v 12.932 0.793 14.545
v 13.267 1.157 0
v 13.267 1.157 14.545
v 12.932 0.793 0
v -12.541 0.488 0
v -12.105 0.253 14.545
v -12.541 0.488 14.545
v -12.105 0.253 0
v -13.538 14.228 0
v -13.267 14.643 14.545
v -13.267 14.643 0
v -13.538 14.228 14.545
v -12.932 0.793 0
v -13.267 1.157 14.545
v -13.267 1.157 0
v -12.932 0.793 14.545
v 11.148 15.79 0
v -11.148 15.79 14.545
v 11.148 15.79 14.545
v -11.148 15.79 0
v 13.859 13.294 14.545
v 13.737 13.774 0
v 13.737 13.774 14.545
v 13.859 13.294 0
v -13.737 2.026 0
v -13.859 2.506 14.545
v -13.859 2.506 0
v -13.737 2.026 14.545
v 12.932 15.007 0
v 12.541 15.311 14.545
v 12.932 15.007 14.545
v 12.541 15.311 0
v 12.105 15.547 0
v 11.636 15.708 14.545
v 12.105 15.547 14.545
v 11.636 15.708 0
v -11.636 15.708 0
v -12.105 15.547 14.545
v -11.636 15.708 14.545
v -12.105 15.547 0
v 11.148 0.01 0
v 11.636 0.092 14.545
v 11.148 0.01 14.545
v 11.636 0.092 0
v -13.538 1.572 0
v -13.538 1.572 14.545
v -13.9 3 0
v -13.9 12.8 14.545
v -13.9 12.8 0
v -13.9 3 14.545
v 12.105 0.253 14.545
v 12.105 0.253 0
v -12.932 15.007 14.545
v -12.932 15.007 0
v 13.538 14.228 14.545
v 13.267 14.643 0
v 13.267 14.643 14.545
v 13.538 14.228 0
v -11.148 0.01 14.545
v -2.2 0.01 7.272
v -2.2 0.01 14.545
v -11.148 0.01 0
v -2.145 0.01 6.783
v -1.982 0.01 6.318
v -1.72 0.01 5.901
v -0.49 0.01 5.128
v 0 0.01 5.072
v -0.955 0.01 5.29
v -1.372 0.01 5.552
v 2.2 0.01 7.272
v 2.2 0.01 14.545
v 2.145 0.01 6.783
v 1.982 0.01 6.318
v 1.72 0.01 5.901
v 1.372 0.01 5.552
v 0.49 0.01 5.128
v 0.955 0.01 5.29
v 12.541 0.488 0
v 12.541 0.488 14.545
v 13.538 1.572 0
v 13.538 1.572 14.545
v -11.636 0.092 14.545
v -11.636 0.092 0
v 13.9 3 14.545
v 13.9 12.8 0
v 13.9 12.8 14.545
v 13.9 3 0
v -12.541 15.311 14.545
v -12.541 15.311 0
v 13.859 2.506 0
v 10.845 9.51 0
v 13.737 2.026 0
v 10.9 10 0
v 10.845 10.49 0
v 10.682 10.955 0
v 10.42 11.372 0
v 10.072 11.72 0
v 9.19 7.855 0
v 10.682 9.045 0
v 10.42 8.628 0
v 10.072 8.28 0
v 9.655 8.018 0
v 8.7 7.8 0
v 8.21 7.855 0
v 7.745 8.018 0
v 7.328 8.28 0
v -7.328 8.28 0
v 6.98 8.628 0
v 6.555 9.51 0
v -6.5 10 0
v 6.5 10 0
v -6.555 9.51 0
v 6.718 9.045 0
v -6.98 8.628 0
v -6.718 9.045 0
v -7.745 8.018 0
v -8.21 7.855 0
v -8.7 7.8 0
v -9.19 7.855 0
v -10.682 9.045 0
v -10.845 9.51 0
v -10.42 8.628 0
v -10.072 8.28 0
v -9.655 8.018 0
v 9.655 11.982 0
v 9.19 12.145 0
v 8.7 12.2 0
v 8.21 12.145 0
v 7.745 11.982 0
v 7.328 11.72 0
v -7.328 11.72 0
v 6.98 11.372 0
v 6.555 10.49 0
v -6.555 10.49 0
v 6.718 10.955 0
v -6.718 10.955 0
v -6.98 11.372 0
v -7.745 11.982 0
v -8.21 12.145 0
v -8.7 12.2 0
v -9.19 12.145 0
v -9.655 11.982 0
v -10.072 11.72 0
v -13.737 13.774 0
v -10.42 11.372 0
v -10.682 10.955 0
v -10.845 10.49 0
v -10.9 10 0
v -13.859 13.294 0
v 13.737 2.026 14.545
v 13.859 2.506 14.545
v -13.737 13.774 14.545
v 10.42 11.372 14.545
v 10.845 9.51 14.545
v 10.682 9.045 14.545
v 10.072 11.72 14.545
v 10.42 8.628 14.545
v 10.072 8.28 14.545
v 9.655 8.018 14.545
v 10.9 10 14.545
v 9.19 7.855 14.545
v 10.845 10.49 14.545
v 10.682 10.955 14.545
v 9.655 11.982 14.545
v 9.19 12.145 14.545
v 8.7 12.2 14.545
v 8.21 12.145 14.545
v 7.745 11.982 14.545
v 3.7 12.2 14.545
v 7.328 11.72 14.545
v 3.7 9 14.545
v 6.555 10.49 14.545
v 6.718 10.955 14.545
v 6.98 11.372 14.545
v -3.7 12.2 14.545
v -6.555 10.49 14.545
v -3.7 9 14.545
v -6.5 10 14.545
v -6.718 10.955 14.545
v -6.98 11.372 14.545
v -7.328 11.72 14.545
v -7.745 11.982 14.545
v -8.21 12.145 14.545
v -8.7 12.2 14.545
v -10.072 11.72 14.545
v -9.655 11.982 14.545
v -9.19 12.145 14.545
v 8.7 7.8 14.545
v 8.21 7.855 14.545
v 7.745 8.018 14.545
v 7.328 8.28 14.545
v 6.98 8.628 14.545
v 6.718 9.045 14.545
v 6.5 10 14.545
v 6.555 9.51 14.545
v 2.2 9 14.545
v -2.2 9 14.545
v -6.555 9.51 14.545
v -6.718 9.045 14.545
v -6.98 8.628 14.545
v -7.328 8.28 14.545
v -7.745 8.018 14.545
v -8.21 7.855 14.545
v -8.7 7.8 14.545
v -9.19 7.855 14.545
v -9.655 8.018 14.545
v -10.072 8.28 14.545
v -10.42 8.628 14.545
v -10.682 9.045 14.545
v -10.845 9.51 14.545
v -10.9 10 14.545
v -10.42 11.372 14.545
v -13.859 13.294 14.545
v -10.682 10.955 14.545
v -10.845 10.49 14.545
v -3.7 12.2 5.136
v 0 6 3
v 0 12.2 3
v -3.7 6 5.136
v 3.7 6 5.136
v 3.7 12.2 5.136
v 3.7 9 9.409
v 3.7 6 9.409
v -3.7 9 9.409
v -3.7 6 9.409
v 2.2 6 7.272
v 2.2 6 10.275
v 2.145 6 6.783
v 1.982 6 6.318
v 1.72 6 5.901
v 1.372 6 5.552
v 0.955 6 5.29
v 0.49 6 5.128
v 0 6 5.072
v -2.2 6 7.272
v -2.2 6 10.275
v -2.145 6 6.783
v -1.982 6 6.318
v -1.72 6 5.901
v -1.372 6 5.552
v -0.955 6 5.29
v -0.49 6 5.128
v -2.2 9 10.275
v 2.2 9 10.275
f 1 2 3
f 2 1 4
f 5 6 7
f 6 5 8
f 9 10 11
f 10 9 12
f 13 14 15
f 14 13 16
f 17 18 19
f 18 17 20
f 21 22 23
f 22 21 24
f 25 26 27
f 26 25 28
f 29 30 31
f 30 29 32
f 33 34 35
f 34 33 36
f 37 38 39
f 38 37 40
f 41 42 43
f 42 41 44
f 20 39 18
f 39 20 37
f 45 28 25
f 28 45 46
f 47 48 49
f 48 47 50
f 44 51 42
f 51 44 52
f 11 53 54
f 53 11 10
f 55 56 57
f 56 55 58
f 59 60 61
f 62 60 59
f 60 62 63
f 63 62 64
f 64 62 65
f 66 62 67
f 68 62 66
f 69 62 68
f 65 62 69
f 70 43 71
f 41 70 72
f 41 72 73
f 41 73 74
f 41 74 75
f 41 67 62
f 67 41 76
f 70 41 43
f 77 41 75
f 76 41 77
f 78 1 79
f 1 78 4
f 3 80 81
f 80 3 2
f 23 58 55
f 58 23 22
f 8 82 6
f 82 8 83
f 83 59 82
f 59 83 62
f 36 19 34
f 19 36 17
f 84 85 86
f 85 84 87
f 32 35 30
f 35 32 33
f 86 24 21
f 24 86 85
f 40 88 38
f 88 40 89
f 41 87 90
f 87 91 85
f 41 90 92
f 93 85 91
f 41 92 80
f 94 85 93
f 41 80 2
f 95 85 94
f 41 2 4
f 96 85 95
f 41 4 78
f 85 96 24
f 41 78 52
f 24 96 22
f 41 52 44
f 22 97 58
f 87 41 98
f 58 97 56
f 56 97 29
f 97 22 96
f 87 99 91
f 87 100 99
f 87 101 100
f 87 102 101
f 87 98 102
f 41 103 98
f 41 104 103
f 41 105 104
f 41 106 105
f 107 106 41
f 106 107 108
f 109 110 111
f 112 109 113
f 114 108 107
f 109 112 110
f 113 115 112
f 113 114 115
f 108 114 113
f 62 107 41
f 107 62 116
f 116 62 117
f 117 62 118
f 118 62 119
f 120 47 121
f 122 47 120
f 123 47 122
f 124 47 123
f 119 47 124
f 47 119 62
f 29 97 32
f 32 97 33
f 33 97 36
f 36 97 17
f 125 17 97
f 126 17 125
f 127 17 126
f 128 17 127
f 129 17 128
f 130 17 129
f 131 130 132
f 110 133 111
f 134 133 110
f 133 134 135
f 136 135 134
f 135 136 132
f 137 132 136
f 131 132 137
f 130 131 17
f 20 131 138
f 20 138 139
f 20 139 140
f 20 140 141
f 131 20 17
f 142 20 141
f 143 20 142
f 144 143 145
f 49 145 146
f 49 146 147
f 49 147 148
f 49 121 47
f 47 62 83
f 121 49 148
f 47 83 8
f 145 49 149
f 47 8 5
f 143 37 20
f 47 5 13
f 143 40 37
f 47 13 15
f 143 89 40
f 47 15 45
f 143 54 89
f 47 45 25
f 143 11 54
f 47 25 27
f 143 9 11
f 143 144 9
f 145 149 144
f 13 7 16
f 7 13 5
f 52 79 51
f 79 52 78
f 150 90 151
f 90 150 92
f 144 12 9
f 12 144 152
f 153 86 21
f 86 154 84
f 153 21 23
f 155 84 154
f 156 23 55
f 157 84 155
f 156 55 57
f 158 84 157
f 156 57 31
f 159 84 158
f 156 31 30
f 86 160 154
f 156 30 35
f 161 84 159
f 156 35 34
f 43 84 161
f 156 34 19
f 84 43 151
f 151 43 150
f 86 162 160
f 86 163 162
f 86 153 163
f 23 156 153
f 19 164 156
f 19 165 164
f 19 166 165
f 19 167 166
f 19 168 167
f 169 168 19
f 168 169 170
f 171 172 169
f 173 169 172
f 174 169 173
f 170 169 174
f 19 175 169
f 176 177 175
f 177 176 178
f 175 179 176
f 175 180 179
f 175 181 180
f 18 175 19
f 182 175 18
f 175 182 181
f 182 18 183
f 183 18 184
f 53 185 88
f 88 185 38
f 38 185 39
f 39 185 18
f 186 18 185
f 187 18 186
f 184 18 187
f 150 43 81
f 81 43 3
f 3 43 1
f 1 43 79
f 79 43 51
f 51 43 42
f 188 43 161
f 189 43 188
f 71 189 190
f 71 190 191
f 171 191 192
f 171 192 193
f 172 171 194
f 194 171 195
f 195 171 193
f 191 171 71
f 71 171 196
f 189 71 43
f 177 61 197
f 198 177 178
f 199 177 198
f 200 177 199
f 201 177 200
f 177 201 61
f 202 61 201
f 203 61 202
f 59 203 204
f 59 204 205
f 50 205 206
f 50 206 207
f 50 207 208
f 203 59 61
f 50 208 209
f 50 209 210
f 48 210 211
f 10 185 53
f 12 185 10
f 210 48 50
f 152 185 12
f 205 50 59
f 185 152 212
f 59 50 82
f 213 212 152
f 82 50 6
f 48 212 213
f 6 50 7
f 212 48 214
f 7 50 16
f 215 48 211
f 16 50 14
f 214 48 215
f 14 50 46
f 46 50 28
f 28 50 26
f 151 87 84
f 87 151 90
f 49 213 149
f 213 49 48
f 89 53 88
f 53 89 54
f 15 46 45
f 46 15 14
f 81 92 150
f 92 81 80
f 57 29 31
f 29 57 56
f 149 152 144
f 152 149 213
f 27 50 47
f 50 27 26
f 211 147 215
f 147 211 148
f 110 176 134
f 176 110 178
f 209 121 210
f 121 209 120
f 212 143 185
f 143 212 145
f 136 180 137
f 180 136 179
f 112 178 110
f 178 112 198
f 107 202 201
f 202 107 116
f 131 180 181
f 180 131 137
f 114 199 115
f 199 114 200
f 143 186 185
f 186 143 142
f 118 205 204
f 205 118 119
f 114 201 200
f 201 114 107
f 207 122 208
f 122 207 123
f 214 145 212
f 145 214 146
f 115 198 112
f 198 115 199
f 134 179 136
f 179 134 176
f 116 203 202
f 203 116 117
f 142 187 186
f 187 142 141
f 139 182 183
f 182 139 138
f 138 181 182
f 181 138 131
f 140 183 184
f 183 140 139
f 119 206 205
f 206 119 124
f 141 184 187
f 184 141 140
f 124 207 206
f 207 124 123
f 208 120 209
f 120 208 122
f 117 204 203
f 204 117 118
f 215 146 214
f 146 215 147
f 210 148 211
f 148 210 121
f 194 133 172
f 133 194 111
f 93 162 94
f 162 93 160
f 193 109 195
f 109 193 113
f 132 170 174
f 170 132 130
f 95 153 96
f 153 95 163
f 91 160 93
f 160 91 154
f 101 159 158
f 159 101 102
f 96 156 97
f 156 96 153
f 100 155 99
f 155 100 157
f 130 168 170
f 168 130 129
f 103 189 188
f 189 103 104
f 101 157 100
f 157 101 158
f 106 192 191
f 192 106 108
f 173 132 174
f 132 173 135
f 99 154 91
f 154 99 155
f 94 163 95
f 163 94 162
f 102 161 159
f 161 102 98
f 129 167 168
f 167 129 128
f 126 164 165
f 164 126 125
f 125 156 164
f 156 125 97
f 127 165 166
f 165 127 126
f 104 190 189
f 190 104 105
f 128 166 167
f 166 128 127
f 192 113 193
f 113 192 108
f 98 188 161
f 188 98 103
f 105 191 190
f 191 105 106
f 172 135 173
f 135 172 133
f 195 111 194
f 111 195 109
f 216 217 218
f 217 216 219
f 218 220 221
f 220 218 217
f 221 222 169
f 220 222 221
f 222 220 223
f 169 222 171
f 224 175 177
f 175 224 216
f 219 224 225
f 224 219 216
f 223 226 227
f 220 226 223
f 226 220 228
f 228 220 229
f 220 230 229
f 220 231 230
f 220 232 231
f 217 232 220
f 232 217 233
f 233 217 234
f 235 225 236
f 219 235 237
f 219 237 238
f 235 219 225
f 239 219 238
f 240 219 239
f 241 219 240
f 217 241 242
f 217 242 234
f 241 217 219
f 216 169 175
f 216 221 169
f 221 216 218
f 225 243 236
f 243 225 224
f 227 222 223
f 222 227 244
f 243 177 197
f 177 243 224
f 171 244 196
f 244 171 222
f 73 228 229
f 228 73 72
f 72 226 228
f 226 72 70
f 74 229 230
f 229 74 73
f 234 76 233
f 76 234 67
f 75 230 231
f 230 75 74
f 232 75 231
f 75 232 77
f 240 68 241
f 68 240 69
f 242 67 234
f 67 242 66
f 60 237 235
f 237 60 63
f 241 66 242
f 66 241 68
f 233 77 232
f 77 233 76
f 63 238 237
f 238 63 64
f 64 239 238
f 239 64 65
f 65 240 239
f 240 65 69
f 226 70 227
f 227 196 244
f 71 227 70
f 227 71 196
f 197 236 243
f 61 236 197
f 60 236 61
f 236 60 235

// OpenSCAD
// file: functions.scad
/*******************************************************************

This OpenSCAD code and its rendered 3D model are part of the

	Kühling&Kühling RepRap Industrial 3D Printer


All details, BOM, assembling instructions and latest sources:
	http://kuehlingkuehling.de

Designed and developed by:
	Jonas Kühling <mail@jonaskuehling.de>
	Simon Kühling <mail@simonkuehling.de>

Licensed under:
	Creative Commons Attribution-ShareAlike
	CC BY-SA 3.0
	http://creativecommons.org/licenses/by-sa/3.0/

*******************************************************************/

module teardrop (r=4.5,h=20,alpha=45,teardropcorner=0,fulldrop=0){		// tear drop hole for top-centering
											// use teardropcorner=1 for bottom horizontal corners
	render()
	translate([-h/2,0,0])
		rotate([-270,0+(teardropcorner*180),90])
			difference(){
				linear_extrude(height=h){
					circle(r);
					polygon(points=[[0,0],[r*cos(alpha),r*sin(alpha)],[0,r/sin(alpha)],[-r*cos(alpha),r*sin(alpha)]], paths=[[0,1,2,3]]);
				}
				if(fulldrop==0) 
					translate([0,(r/sin(alpha))/2+r,h/2]) cube([2*r+2,r/sin(alpha),h+2],center=true);
			}
}

//teardrop(4.5,22,fulldrop=true);



module teardropcentering (r=4.5,h=20,alpha=45){				// tear drop hole for top-centering
	centering_offset_factor = 1.1;
	render()
	translate([-h/2,0,0])
		rotate([-270,0,90])
			difference(){
				linear_extrude(height=h){
					circle(r, $fn=24);
					polygon(points=[[0,0],[r*cos(alpha),r*sin(alpha)],[0,r/sin(alpha)],[-r*cos(alpha),r*sin(alpha)]], paths=[[0,1,2,3]]);
				}
				translate([0,(r/sin(alpha))/2+r*centering_offset_factor,h/2]) cube([2*r+2,r/sin(alpha),h+2],center=true);
			}
}

//teardropcentering();



module teardropcentering_half (r=4.5,h=20, bottom=0,alpha=45){				// tear drop hole for top-centering
																// upper half (bottom=0) or bottom half (bottom=1)
	centering_offset_factor = 1.2;
	render()
	translate([-h/2,0,0])
		rotate([-270,0,90])
			difference(){
				linear_extrude(height=h){
					circle(r, $fn=24);
					polygon(points=[[0,0],[r*cos(alpha),r*sin(alpha)],[0,r/sin(alpha)],[-r*cos(alpha),r*sin(alpha)]], paths=[[0,1,2,3]]);
				}
				translate([0,(r/sin(alpha))/2+r*centering_offset_factor,h/2]) cube([2*r+2,r/sin(alpha),h+2],center=true);
				translate([0,-(r*centering_offset_factor)/2-0.5+bottom*(r*centering_offset_factor+1),h/2]) cube([2*r+2,r*centering_offset_factor+1,h+2],center=true);
			}
}

//teardropcentering_half(bottom=0);


module polyhole(d,h){
	n = max(round(2 * d),3);
	cylinder(h = h, r = (d / 2) / cos (180 / n), $fn = n, center=true);
}



module roundcorner(radius,edge_length){
	render()
	translate([0,0,-1])
		difference(){
			translate([-1,-1,0])
				cube(size = [radius+1,radius+1,edge_length+2], center = false);
			translate(v = [radius,radius,-1])
				cylinder(h = edge_length+4, r=radius, center=false,$fs=0.1);
		}
}

//roundcorner(5,5);



module roundcorner_tear(radius,edge_length){
	render()
	difference(){
		translate([-1,-1,-1])
			cube(size = [edge_length+2, radius+1, radius+1], center = false);
		translate([(edge_length+4)/2-2, radius, radius])
			teardrop(radius, edge_length+4,teardropcorner=1);
	}
}

//roundcorner_tear(8,20);


module roundedge_tear(radius){
	render()
	difference(){
		translate([-1,-1,-1])
			cube(size = [radius+1, radius+1, radius+1], center = false);
		translate([radius,radius,radius])
			union(){
				sphere(r=radius, $fs=0.1);
				translate([0,0,-radius])
					cylinder(r1=(radius*sin(45))-(radius-(radius*sin(45))),r2=radius*sin(45),h=(radius-(radius*sin(45))), $fs=0.1);
			}
	}
}

//roundedge_tear(20);



module roundedge(radius){
	render()
	difference(){
		translate([-1,-1,-1])
			cube(size = [radius+1, radius+1, radius+1], center = false);
		translate([radius,radius,radius])
			sphere(r=radius, $fs=0.1);
	}
}

//roundedge(5);


module nut_trap(nut_wrench_size,trap_height,vertical=0, clearance=0.2,center=true){		// M3 wrench size = 5.5
	radius = cornerdiameter(nut_wrench_size+2*clearance) /2;
	rotate([0,vertical*90,0])
		cylinder(h = trap_height, r = radius, center=center, $fn = 6);
}

//nut_trap(5,5,0);

module nut_slot(nut_wrench_size,nut_height, nut_elevation,vertical=0, clearance=0.2){		// M3 wrench size = 5.5
	radius = cornerdiameter(nut_wrench_size+2*clearance) /2;
	slot_height = nut_height+2*clearance;
	slot_width = nut_wrench_size+2*clearance;
	rotate([0,vertical*270,0]){
		cylinder(h = slot_height, r = radius, center=true, $fn = 6);
		translate([0,-slot_width/2,-slot_height/2]) cube([nut_elevation+1,slot_width,slot_height]);
	}
}

//nut_slot(5.5,3,4,1);

function cornerdiameter(wrench_size) =  2* ((wrench_size)/2)/ cos(180/6);
function cornerdiameter_8(wrench_size) =  2* ((wrench_size)/2)/ cos(180/8);
// main file
/*******************************************************************

This OpenSCAD code and its rendered 3D model are part of the

	Kühling&Kühling RepRap Industrial 3D Printer


All details, BOM, assembling instructions and latest sources:
	http://kuehlingkuehling.de

Designed and developed by:
	Jonas Kühling <mail@jonaskuehling.de>
	Simon Kühling <mail@simonkuehling.de>

Licensed under:
	Creative Commons Attribution-ShareAlike
	CC BY-SA 3.0
	http://creativecommons.org/licenses/by-sa/3.0/

*******************************************************************/

include <configuration.scad>

y_motor_top_body_width = 2*frame_washer_wall+2*clearance+2*frame_screw_dia+2*wall+2*clearance+belt_tensioning_screw_head_wrench;
y_motor_top_body_length = wall+cornerdiameter(belt_tensioning_screw_head_wrench+2*clearance)+wall;
y_motor_top_body_height = frame_width-frame_enclosure_thickness-clearance;



rotate([-90,0,0])
y_motor_top();




module y_motor_top(){

	difference(){

		// main body
		hull(){
			translate([-y_motor_top_body_width/2+wall,0,wall])
				rotate([90,0,0])
					cylinder(r=wall,h=y_motor_top_body_length);
			translate([y_motor_top_body_width/2-wall,0,wall])
				rotate([90,0,0])
					cylinder(r=wall,h=y_motor_top_body_length);
			translate([-y_motor_top_body_width/2+wall,0,y_motor_top_body_height-wall])
				rotate([90,0,0])
					cylinder(r=wall,h=y_motor_top_body_length);
			translate([y_motor_top_body_width/2-wall,0,y_motor_top_body_height-wall])
				rotate([90,0,0])
					cylinder(r=wall,h=y_motor_top_body_length);
		}

		// frame screw holes
		translate([-y_motor_top_body_width/2+frame_washer_wall+clearance+frame_screw_dia/2,1,frame_width/2])
			rotate([90,0,0])
				cylinder(r=frame_screw_dia/2+clearance,h=y_motor_top_body_length+2);
		translate([-(-y_motor_top_body_width/2+frame_washer_wall+clearance+frame_screw_dia/2),1,frame_width/2])
			rotate([90,0,0])
				cylinder(r=frame_screw_dia/2+clearance,h=y_motor_top_body_length+2);

		// belt tensioner screw head trap
		translate([0,-wall-cornerdiameter(belt_tensioning_screw_head_wrench+2*clearance)/2,2*wall])
			rotate([0,0,30])
				cylinder(r=cornerdiameter(belt_tensioning_screw_head_wrench+2*clearance)/2,h=clearance+belt_tensioning_screw_head_wrench_length+clearance+belt_tensioning_screw_head_wrench_length+clearance,$fn=6);
		translate([-(belt_tensioning_screw_head_wrench+2*clearance)/2,-y_motor_top_body_length-wall-cornerdiameter(belt_tensioning_screw_head_wrench+2*clearance)/2,2*wall+clearance+belt_tensioning_screw_head_wrench_length])
			cube([belt_tensioning_screw_head_wrench+2*clearance,y_motor_top_body_length,2*clearance+belt_tensioning_screw_head_wrench_length]);
		translate([0,-wall-cornerdiameter(belt_tensioning_screw_head_wrench+2*clearance)/2,-1])
			cylinder(r=belt_tensioning_screw_dia/2+clearance,h=clearance+belt_tensioning_screw_head_wrench_length+clearance+belt_tensioning_screw_head_wrench_length+clearance+2*wall+1);
		translate([-(belt_tensioning_screw_dia+2*clearance)/2,-y_motor_top_body_length-wall-cornerdiameter(belt_tensioning_screw_head_wrench+2*clearance)/2,-1])
			cube([belt_tensioning_screw_dia+2*clearance,y_motor_top_body_length,clearance+belt_tensioning_screw_head_wrench_length+clearance+belt_tensioning_screw_head_wrench_length+clearance+2*wall+1]);

	}
}
